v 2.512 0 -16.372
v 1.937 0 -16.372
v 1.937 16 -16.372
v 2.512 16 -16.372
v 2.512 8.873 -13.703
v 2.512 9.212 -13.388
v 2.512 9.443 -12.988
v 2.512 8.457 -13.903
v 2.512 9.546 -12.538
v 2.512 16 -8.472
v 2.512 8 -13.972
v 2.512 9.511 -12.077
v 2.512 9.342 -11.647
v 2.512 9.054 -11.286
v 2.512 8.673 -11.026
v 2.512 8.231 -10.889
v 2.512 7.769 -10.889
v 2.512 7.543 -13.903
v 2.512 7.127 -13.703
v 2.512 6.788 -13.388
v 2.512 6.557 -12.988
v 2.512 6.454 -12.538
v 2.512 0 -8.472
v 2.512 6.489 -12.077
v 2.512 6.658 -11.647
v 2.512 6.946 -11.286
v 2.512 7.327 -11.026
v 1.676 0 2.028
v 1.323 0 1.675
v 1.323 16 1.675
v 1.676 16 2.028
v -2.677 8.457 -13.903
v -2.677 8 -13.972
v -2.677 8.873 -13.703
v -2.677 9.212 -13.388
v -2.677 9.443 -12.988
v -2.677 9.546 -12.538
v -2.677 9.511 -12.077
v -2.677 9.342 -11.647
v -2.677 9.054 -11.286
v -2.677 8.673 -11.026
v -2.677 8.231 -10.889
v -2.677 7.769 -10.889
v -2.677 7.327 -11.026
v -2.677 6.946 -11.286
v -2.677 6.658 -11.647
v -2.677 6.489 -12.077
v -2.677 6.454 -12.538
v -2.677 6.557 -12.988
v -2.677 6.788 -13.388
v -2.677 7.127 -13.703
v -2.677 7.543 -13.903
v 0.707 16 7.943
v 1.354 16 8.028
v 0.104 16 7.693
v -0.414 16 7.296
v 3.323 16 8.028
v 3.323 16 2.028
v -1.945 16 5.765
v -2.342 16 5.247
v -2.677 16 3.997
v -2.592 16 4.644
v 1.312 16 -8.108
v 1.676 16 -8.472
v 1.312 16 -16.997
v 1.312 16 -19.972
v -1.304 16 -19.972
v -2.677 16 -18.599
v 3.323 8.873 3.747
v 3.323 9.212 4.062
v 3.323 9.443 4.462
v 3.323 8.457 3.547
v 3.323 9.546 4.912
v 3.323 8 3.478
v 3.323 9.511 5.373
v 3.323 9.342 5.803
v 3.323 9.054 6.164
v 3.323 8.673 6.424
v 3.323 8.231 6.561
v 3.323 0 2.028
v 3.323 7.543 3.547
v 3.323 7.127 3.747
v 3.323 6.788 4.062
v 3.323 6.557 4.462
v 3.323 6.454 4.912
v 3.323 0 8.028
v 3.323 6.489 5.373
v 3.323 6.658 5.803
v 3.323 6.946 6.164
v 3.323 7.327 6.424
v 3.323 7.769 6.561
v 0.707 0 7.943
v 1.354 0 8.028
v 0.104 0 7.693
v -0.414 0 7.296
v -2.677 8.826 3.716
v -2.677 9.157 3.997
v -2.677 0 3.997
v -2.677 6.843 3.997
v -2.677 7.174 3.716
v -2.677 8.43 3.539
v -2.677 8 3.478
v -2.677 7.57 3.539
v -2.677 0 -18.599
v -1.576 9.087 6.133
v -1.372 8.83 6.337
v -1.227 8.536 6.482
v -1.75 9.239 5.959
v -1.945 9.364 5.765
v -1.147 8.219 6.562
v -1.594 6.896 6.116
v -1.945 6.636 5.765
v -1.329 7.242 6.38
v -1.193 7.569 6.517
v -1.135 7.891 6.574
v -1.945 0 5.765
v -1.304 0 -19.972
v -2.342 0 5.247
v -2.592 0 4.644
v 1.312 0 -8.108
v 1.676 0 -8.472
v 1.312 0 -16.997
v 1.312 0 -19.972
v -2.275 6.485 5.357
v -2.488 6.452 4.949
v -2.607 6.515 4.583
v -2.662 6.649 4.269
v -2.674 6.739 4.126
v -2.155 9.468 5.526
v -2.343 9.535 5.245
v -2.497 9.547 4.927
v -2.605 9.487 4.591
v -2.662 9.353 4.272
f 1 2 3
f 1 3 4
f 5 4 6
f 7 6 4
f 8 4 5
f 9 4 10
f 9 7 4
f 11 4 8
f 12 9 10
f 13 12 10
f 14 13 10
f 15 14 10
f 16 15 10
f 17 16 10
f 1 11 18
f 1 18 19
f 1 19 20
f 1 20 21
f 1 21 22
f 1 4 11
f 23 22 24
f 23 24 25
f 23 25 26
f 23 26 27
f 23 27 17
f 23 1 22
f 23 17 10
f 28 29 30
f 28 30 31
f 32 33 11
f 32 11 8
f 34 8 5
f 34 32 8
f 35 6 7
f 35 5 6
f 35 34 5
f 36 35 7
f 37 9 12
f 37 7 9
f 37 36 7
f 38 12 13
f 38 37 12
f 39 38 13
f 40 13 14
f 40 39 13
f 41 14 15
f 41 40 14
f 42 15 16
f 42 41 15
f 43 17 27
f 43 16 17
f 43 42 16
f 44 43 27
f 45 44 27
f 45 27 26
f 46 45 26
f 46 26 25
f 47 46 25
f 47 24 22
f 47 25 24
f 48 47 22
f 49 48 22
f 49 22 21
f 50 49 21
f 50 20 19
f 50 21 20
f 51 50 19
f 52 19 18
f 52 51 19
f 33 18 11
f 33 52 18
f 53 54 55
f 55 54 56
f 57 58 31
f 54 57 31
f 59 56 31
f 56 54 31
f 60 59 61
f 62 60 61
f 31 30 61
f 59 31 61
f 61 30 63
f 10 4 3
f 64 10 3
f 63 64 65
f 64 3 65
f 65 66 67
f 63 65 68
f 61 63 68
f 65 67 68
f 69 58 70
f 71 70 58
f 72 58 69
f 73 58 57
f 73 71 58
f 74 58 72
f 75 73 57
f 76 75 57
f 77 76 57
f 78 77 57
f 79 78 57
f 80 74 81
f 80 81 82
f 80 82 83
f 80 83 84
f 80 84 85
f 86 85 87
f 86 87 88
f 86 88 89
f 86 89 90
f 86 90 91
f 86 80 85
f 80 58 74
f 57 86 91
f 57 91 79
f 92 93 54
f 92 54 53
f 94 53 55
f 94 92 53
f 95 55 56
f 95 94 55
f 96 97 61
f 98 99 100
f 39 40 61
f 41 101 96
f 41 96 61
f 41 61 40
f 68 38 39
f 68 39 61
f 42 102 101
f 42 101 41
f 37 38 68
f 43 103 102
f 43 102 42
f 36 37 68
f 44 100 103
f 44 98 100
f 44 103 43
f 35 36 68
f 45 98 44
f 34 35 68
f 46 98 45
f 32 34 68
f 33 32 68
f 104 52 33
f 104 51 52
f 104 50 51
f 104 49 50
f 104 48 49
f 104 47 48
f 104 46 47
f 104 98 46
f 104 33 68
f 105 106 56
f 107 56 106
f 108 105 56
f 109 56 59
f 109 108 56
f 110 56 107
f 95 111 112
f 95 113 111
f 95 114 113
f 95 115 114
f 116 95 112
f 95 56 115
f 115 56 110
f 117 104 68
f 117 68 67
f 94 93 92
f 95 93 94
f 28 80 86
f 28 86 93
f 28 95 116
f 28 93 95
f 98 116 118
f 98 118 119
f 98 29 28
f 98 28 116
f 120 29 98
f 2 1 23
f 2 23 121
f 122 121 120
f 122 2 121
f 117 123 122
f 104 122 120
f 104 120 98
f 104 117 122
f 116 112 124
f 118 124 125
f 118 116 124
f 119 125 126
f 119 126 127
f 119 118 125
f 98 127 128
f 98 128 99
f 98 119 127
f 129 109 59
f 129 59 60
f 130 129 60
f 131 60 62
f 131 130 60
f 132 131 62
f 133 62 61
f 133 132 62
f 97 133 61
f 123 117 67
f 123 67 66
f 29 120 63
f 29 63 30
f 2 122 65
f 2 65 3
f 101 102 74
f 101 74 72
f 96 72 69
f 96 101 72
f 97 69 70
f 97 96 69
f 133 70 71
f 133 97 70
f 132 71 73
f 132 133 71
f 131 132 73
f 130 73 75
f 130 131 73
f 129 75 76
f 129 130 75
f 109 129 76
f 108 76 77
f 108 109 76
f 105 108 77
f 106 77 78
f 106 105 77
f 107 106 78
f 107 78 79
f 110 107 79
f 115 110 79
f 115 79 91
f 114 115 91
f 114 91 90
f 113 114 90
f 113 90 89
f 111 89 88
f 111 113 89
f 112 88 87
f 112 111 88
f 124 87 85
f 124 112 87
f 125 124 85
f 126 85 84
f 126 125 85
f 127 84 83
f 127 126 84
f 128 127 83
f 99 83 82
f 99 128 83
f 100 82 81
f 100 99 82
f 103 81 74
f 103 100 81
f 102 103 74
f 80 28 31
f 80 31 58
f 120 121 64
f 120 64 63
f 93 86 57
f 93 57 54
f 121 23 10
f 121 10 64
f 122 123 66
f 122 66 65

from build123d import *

# Parameters (mm, degrees)
EXTRUDE_1_DEPTH          = 16
CUT_EXTRUDE_1_DEPTH      = 27.111454755
CUT_EXTRUDE_1_DEPTH_BACK = 27.111454755
SKETCH_2_R               = 1.55


with BuildPart() as part:
    # ｽｹｯﾁ1 → ﾎﾞｽ - 押し出し1 (new body)
    with BuildSketch(Plane(origin=(0, 0, 0), x_dir=(1, 0, 0), z_dir=(0, 1, 0))):
        with BuildLine():
            ThreePointArc((-1.944631198, -5.764737827), (-2.486563076, -4.953679455), (-2.676864245, -3.996970874))
            Line((-2.676864245, -3.996970874), (-2.676864245, 17.239005736))
            Line((-2.676864245, 17.239005736), (-2.676864245, 18.599064096))
            Line((-2.676864245, 18.599064096), (-1.303885205, 19.972043135))
            Line((-1.303885205, 19.972043135), (0.056173154, 19.972043135))
            Line((0.056173154, 19.972043135), (1.312120474, 19.972043135))
            Line((1.312120474, 19.972043135), (1.312120474, 16.99686443))
            Line((1.312120474, 16.99686443), (1.936941769, 16.372043135))
            Line((1.936941769, 16.372043135), (2.512120474, 16.372043135))
            Line((2.512120474, 16.372043135), (2.512120474, 8.472043135))
            Line((2.512120474, 8.472043135), (1.676155012, 8.472043135))
            Line((1.676155012, 8.472043135), (1.312120474, 8.108008597))
            Line((1.312120474, 8.108008597), (1.323135755, -1.674937608))
            Line((1.323135755, -1.674937608), (1.676155012, -2.027956865))
            Line((1.676155012, -2.027956865), (3.323135755, -2.027956865))
            Line((3.323135755, -2.027956865), (3.323135755, -8.027956865))
            Line((3.323135755, -8.027956865), (1.354121746, -8.027956865))
            ThreePointArc((1.354121746, -8.027956865), (0.397413165, -7.837655696), (-0.413645207, -7.295723818))
            Line((-0.413645207, -7.295723818), (-1.944631198, -5.764737827))
        make_face()
    extrude(amount=EXTRUDE_1_DEPTH)

    # ｽｹｯﾁ2 → ｶｯﾄ - 押し出し1 (cut, two sides: drawn at the far end of the back side and taken through both)
    with BuildSketch(Plane(origin=(2.512120474, 0, 0), x_dir=(0, 0, -1), z_dir=(1, 0, 0)).offset(-CUT_EXTRUDE_1_DEPTH_BACK)):
        with Locations((12.422043135, 8)):
            Circle(SKETCH_2_R)
        with Locations((-5.027956865, 8)):
            Circle(SKETCH_2_R)
    extrude(amount=CUT_EXTRUDE_1_DEPTH + CUT_EXTRUDE_1_DEPTH_BACK, mode=Mode.SUBTRACT)


solid = part.part
